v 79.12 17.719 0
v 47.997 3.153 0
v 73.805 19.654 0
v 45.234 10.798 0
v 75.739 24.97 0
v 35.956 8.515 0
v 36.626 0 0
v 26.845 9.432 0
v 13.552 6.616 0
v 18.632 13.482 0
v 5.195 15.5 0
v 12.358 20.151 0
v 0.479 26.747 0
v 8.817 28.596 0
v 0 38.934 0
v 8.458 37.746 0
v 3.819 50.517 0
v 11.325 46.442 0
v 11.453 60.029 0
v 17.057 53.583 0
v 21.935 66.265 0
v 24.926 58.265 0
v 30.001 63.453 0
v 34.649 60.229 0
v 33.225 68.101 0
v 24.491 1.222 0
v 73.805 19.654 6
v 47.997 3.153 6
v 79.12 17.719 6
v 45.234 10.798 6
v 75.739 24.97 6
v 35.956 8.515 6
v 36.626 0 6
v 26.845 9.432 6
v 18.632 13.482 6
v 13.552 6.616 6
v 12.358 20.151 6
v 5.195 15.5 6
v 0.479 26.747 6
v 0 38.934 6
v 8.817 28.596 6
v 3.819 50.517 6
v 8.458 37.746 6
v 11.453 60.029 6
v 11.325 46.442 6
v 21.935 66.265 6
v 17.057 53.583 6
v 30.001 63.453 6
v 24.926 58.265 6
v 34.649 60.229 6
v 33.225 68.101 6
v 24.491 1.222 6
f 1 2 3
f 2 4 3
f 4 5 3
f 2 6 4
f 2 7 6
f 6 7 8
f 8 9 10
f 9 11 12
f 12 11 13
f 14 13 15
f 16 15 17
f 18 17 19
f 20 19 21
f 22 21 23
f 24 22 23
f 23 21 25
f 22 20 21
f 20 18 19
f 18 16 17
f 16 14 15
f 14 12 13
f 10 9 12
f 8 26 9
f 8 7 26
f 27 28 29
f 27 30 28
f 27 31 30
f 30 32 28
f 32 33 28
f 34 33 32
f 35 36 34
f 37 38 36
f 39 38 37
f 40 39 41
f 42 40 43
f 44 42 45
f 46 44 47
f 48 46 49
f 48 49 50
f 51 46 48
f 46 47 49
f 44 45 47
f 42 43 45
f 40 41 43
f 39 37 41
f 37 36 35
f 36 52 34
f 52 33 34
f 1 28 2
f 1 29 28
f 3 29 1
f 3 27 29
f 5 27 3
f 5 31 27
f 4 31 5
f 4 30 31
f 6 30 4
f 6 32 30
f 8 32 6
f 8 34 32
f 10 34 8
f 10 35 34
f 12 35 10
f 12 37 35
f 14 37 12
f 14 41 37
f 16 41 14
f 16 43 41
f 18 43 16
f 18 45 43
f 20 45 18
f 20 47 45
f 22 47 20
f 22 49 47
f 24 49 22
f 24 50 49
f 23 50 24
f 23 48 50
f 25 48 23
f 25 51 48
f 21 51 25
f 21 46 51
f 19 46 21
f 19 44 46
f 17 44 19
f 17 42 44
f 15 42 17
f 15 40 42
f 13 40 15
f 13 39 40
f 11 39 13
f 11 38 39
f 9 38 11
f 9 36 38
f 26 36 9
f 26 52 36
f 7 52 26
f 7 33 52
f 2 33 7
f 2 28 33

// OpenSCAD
$fn = 32;

// ----------------------------------------------------------------------
// Hook plate: curl radius 30 mm over 205 degrees, 8 mm thick band
// ----------------------------------------------------------------------

// --- parameters (mm) ---
profile_height = 6;       // extrusion height
profile_points = 26;      // points of the closed outline

profile = [[30.001, 63.453], [33.225, 68.101], [21.935, 66.265], [11.453, 60.029], [3.819, 50.517], [0, 38.934], [0.479, 26.747], [5.195, 15.5], [13.552, 6.616], [24.491, 1.222], [36.626, 0], [47.997, 3.153], [79.12, 17.719], [73.805, 19.654], [75.739, 24.97], [45.234, 10.798], [35.956, 8.515], [26.845, 9.432], [18.632, 13.482], [12.358, 20.151], [8.817, 28.596], [8.458, 37.746], [11.325, 46.442], [17.057, 53.583], [24.926, 58.265], [34.649, 60.229]];  // single closed polygon, 26 points, counter clockwise

// --- the one profile operation ---
linear_extrude(height = profile_height) polygon(points = profile);
